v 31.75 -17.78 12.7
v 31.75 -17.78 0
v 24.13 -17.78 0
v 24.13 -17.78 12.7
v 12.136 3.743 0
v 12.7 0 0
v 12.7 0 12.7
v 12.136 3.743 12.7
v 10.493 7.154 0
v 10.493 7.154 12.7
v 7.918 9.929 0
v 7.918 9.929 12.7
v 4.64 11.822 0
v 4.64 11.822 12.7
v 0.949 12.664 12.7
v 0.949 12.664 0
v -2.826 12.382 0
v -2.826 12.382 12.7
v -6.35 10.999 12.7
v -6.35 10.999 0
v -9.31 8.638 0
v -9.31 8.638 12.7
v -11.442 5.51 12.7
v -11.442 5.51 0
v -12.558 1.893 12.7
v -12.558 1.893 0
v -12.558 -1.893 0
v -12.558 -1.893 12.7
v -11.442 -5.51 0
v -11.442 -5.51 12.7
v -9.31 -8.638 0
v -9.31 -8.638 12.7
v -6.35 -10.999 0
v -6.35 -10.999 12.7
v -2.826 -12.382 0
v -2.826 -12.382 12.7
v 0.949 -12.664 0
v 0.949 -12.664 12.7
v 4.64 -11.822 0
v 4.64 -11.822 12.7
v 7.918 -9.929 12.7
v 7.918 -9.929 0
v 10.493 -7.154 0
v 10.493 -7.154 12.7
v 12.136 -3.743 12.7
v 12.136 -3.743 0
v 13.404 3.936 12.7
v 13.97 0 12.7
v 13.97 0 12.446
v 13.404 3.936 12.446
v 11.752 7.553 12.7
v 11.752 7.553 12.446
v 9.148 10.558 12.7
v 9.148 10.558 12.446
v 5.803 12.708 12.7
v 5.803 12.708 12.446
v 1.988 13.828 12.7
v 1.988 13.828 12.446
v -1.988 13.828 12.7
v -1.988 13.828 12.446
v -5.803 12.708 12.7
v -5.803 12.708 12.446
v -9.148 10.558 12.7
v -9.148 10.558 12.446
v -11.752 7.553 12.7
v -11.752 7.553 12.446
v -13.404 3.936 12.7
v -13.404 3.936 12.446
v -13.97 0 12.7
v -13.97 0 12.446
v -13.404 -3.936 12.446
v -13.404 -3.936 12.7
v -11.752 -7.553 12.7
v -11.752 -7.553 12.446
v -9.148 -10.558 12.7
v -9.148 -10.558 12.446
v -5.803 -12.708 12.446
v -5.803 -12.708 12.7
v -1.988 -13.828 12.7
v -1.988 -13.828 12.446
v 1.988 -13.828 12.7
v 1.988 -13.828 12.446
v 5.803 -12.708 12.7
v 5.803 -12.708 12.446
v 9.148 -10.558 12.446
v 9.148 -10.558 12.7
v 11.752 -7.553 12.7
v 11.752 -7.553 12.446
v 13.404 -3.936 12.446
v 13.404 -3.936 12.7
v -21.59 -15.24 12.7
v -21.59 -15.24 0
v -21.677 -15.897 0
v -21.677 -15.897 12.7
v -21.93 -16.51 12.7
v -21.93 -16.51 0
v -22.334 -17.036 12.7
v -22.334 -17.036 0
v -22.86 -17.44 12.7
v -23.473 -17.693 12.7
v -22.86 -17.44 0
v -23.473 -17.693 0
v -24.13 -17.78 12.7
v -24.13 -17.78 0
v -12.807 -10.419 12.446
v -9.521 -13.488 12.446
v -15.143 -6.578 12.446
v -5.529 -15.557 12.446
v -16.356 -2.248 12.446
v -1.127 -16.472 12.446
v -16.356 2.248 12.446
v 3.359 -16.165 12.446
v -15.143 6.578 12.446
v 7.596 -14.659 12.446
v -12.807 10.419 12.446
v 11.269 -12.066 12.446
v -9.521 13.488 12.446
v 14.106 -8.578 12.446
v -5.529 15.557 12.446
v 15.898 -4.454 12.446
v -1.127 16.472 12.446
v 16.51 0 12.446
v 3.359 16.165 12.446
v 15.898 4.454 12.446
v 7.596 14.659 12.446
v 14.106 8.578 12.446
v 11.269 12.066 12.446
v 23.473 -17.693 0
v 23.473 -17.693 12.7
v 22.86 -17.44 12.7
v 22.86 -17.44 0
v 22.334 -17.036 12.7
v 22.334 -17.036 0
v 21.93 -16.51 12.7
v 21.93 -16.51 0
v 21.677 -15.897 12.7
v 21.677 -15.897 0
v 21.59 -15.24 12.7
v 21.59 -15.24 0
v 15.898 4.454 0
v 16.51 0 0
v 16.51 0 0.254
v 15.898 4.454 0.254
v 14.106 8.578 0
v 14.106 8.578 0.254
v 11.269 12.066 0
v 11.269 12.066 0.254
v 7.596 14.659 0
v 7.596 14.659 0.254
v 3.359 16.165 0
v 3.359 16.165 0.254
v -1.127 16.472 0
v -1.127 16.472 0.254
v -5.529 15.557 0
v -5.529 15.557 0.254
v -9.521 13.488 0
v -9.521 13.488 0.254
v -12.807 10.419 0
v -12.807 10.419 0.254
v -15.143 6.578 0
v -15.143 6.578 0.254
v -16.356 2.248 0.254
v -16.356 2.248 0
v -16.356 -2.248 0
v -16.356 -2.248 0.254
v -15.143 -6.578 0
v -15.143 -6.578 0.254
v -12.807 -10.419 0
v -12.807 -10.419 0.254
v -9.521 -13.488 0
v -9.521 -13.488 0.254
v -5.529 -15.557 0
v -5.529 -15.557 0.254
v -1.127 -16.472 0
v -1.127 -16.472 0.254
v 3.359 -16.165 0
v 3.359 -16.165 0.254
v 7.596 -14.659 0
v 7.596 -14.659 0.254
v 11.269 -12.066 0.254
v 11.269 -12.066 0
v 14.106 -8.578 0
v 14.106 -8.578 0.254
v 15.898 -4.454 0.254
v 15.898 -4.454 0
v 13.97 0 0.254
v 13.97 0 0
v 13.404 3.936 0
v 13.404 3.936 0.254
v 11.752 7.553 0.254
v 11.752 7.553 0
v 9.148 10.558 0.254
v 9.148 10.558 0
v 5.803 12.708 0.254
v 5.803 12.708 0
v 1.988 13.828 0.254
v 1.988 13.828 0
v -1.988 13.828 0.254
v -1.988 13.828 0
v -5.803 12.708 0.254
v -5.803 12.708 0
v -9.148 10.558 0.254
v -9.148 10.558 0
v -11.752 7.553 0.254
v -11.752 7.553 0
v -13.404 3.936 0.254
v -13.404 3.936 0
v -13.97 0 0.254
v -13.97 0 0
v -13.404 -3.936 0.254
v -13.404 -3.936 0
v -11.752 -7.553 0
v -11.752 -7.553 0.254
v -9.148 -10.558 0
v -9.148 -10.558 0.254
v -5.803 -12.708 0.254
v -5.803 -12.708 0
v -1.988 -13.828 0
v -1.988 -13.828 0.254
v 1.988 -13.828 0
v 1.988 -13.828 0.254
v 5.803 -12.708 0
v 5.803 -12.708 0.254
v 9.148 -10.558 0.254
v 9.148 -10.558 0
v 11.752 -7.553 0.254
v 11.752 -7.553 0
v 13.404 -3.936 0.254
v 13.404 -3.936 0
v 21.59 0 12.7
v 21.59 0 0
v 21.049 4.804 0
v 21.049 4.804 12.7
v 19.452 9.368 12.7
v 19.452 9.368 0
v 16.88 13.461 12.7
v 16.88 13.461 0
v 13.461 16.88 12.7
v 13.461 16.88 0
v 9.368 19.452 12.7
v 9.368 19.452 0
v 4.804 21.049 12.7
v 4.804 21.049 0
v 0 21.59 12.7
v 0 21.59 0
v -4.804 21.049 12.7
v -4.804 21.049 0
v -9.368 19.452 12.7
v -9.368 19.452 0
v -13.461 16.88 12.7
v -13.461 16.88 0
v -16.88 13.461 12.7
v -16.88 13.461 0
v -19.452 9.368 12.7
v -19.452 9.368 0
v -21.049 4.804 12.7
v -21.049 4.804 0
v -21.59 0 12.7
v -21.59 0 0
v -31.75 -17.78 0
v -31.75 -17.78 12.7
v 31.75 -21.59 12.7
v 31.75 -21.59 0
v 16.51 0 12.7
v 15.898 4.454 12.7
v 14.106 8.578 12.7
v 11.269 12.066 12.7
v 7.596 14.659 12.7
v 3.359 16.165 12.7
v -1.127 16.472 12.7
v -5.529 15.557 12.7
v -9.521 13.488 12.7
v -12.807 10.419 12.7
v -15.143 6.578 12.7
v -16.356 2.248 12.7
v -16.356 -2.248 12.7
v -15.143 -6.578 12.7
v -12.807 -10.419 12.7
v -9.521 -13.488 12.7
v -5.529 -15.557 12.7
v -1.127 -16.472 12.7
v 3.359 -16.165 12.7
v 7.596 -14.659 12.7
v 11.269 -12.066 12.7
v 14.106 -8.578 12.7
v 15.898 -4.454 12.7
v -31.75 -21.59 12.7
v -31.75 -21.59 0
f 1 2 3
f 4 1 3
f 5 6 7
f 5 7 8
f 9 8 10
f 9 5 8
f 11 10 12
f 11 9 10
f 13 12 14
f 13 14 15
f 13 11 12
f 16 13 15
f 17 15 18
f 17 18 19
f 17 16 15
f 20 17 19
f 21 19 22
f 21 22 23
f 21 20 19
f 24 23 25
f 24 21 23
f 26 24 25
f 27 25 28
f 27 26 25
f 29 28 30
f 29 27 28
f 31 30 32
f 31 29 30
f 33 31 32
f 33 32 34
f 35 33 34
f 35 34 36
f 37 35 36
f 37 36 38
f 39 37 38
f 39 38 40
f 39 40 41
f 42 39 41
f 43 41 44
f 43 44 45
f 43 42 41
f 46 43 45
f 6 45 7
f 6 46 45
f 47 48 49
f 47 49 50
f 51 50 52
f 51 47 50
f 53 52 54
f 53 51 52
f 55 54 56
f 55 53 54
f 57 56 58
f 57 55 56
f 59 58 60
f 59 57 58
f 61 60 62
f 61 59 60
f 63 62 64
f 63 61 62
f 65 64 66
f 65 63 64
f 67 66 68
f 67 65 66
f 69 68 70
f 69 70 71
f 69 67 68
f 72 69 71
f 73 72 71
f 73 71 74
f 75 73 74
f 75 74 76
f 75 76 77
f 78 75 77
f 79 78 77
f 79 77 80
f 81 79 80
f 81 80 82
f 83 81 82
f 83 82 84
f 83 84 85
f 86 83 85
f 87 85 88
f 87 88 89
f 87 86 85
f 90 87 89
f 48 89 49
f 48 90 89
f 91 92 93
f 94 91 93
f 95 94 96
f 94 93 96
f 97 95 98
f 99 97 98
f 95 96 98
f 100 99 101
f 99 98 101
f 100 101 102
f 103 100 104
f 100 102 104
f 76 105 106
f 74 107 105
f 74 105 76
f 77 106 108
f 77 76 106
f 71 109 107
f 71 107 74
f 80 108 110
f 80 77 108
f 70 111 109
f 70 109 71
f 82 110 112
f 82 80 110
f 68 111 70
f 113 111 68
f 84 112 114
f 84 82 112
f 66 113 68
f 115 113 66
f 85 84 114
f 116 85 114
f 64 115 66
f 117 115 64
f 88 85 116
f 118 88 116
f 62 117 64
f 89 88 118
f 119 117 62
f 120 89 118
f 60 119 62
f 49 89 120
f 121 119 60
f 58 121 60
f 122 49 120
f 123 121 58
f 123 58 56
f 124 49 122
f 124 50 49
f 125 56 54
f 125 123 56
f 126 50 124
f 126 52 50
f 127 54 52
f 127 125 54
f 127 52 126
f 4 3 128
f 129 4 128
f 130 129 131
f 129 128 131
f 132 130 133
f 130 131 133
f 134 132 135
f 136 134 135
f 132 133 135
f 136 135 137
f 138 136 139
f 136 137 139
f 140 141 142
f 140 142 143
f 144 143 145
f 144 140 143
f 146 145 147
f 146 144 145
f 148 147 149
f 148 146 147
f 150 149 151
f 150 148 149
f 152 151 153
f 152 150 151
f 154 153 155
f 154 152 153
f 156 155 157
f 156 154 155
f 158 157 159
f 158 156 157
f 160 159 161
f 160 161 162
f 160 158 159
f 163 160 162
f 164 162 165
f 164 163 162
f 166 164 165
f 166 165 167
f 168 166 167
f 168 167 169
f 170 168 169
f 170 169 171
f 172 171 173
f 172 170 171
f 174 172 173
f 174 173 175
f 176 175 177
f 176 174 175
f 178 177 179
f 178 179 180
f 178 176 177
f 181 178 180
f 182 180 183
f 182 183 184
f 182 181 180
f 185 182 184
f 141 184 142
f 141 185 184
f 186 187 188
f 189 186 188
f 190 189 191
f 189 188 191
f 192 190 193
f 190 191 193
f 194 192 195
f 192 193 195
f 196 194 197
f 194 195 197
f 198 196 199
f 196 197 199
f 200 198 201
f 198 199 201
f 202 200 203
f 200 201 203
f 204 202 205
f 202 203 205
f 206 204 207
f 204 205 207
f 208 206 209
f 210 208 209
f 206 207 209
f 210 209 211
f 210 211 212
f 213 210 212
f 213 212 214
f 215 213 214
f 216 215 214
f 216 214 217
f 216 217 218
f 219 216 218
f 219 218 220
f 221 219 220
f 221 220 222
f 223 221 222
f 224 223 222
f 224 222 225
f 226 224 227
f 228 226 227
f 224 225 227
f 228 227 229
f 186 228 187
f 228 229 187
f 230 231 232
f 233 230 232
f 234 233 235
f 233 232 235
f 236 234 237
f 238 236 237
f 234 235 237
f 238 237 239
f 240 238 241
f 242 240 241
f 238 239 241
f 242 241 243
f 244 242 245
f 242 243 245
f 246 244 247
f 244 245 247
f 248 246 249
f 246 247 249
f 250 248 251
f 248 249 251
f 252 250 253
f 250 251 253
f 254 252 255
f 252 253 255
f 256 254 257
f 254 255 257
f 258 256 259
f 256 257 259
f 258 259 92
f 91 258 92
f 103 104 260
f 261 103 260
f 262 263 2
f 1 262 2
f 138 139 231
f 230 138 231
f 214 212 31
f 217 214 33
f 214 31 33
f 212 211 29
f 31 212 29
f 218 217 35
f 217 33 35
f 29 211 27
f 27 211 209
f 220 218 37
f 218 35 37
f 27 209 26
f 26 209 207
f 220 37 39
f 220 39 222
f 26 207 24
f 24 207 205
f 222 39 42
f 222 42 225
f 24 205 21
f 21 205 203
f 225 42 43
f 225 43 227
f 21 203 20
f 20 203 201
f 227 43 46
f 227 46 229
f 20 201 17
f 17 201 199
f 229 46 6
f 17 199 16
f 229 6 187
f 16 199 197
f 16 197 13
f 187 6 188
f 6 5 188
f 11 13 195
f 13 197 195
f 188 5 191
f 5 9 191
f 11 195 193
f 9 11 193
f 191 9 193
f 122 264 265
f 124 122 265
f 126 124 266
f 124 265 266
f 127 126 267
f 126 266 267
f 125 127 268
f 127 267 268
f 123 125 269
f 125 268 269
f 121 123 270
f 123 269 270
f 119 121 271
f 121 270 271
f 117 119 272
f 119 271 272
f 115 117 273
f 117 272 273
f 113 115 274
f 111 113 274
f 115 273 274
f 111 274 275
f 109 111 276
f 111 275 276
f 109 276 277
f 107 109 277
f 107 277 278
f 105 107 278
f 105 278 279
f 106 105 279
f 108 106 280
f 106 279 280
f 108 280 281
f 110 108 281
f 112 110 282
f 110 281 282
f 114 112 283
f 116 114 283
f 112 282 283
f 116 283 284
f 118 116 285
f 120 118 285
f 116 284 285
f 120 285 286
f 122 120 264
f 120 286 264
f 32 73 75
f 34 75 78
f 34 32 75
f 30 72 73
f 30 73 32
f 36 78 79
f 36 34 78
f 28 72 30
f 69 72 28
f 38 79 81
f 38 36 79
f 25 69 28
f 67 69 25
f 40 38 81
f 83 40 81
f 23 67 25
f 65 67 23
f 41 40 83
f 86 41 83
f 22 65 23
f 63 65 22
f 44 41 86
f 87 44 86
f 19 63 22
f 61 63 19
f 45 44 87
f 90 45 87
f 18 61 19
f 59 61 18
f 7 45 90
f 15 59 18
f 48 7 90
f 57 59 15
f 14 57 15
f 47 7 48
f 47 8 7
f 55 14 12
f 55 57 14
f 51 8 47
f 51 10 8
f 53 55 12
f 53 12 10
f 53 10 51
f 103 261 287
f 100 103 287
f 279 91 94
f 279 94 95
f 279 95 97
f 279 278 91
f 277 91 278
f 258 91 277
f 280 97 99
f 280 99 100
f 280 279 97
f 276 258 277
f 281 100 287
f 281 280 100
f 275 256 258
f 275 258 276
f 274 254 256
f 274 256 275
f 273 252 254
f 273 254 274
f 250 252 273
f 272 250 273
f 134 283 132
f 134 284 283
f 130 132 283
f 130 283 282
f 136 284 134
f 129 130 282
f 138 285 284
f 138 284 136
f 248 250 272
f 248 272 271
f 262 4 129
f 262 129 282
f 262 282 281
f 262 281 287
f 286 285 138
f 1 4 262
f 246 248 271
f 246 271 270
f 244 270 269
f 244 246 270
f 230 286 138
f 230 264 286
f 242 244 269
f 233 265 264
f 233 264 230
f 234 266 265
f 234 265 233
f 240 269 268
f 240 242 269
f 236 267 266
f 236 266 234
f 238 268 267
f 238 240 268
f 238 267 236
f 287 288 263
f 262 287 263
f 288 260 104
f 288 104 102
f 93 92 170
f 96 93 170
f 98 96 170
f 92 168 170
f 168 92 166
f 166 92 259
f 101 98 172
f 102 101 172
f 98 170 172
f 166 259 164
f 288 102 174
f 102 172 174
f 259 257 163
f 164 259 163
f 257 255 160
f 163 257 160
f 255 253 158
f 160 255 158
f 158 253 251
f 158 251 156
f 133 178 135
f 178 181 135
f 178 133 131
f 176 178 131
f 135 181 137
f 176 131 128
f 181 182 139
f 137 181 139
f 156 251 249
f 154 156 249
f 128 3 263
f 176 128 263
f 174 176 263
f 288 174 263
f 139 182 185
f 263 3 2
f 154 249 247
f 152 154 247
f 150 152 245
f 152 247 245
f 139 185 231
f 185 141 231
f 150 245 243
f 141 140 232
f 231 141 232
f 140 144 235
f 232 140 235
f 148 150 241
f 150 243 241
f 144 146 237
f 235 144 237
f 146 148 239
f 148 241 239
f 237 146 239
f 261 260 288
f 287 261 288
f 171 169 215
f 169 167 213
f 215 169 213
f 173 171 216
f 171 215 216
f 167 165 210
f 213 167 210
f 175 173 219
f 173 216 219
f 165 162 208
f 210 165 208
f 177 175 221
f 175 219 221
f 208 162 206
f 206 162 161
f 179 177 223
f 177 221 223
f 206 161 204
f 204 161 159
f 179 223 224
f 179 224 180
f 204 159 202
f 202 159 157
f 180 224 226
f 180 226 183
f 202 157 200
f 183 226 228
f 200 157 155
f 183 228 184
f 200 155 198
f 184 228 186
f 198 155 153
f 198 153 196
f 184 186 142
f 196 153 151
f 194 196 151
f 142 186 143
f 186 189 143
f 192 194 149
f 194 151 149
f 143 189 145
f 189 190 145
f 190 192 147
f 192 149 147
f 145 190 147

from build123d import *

# Parameters (mm, degrees)
SKETCH1_R           = 17.78
SKETCH1_R_2         = 12.7
BOSS_EXTRUDE1_DEPTH = 12.7
SKETCH2_R           = 16.51
SKETCH2_R_2         = 13.97
CUT_EXTRUDE1_DEPTH  = 0.254
SKETCH3_R           = 17.78
BOSS_EXTRUDE3_DEPTH = 12.7


with BuildPart() as part:
    # Sketch1 → Boss-Extrude1 (new body)
    with BuildSketch(Plane.XY):
        Circle(SKETCH1_R)
        Circle(SKETCH1_R_2, mode=Mode.SUBTRACT)
    extrude(amount=BOSS_EXTRUDE1_DEPTH)

    # Sketch2 → Cut-Extrude1 (cut)
    with BuildSketch(Plane.XY.offset(12.7)):
        Circle(SKETCH2_R)
        Circle(SKETCH2_R_2, mode=Mode.SUBTRACT)
    cut_extrude1 = extrude(amount=-CUT_EXTRUDE1_DEPTH, mode=Mode.SUBTRACT)

    # Mirror1: Cut-Extrude1 across plane
    add(cut_extrude1.mirror(Plane.XY.offset(6.35)), mode=Mode.SUBTRACT)

    # Sketch3 → Boss-Extrude3 (add)
    with BuildSketch(Plane.XY):
        with BuildLine():
            Line((-31.75, -21.59), (31.75, -21.59))
            Line((31.75, -21.59), (31.75, -17.78))
            Line((31.75, -17.78), (24.13, -17.78))
            ThreePointArc((24.13, -17.78), (22.333948776, -17.036051224), (21.59, -15.24))
            Line((21.59, -15.24), (21.59, 0))
            ThreePointArc((21.59, 0), (0, 21.59), (-21.59, 0))
            Line((-21.59, 0), (-21.59, -15.24))
            ThreePointArc((-21.59, -15.24), (-22.333948776, -17.036051224), (-24.13, -17.78))
            Line((-24.13, -17.78), (-31.75, -17.78))
            Line((-31.75, -17.78), (-31.75, -21.59))
        make_face()
        Circle(SKETCH3_R, mode=Mode.SUBTRACT)
    extrude(amount=BOSS_EXTRUDE3_DEPTH)


solid = part.part
